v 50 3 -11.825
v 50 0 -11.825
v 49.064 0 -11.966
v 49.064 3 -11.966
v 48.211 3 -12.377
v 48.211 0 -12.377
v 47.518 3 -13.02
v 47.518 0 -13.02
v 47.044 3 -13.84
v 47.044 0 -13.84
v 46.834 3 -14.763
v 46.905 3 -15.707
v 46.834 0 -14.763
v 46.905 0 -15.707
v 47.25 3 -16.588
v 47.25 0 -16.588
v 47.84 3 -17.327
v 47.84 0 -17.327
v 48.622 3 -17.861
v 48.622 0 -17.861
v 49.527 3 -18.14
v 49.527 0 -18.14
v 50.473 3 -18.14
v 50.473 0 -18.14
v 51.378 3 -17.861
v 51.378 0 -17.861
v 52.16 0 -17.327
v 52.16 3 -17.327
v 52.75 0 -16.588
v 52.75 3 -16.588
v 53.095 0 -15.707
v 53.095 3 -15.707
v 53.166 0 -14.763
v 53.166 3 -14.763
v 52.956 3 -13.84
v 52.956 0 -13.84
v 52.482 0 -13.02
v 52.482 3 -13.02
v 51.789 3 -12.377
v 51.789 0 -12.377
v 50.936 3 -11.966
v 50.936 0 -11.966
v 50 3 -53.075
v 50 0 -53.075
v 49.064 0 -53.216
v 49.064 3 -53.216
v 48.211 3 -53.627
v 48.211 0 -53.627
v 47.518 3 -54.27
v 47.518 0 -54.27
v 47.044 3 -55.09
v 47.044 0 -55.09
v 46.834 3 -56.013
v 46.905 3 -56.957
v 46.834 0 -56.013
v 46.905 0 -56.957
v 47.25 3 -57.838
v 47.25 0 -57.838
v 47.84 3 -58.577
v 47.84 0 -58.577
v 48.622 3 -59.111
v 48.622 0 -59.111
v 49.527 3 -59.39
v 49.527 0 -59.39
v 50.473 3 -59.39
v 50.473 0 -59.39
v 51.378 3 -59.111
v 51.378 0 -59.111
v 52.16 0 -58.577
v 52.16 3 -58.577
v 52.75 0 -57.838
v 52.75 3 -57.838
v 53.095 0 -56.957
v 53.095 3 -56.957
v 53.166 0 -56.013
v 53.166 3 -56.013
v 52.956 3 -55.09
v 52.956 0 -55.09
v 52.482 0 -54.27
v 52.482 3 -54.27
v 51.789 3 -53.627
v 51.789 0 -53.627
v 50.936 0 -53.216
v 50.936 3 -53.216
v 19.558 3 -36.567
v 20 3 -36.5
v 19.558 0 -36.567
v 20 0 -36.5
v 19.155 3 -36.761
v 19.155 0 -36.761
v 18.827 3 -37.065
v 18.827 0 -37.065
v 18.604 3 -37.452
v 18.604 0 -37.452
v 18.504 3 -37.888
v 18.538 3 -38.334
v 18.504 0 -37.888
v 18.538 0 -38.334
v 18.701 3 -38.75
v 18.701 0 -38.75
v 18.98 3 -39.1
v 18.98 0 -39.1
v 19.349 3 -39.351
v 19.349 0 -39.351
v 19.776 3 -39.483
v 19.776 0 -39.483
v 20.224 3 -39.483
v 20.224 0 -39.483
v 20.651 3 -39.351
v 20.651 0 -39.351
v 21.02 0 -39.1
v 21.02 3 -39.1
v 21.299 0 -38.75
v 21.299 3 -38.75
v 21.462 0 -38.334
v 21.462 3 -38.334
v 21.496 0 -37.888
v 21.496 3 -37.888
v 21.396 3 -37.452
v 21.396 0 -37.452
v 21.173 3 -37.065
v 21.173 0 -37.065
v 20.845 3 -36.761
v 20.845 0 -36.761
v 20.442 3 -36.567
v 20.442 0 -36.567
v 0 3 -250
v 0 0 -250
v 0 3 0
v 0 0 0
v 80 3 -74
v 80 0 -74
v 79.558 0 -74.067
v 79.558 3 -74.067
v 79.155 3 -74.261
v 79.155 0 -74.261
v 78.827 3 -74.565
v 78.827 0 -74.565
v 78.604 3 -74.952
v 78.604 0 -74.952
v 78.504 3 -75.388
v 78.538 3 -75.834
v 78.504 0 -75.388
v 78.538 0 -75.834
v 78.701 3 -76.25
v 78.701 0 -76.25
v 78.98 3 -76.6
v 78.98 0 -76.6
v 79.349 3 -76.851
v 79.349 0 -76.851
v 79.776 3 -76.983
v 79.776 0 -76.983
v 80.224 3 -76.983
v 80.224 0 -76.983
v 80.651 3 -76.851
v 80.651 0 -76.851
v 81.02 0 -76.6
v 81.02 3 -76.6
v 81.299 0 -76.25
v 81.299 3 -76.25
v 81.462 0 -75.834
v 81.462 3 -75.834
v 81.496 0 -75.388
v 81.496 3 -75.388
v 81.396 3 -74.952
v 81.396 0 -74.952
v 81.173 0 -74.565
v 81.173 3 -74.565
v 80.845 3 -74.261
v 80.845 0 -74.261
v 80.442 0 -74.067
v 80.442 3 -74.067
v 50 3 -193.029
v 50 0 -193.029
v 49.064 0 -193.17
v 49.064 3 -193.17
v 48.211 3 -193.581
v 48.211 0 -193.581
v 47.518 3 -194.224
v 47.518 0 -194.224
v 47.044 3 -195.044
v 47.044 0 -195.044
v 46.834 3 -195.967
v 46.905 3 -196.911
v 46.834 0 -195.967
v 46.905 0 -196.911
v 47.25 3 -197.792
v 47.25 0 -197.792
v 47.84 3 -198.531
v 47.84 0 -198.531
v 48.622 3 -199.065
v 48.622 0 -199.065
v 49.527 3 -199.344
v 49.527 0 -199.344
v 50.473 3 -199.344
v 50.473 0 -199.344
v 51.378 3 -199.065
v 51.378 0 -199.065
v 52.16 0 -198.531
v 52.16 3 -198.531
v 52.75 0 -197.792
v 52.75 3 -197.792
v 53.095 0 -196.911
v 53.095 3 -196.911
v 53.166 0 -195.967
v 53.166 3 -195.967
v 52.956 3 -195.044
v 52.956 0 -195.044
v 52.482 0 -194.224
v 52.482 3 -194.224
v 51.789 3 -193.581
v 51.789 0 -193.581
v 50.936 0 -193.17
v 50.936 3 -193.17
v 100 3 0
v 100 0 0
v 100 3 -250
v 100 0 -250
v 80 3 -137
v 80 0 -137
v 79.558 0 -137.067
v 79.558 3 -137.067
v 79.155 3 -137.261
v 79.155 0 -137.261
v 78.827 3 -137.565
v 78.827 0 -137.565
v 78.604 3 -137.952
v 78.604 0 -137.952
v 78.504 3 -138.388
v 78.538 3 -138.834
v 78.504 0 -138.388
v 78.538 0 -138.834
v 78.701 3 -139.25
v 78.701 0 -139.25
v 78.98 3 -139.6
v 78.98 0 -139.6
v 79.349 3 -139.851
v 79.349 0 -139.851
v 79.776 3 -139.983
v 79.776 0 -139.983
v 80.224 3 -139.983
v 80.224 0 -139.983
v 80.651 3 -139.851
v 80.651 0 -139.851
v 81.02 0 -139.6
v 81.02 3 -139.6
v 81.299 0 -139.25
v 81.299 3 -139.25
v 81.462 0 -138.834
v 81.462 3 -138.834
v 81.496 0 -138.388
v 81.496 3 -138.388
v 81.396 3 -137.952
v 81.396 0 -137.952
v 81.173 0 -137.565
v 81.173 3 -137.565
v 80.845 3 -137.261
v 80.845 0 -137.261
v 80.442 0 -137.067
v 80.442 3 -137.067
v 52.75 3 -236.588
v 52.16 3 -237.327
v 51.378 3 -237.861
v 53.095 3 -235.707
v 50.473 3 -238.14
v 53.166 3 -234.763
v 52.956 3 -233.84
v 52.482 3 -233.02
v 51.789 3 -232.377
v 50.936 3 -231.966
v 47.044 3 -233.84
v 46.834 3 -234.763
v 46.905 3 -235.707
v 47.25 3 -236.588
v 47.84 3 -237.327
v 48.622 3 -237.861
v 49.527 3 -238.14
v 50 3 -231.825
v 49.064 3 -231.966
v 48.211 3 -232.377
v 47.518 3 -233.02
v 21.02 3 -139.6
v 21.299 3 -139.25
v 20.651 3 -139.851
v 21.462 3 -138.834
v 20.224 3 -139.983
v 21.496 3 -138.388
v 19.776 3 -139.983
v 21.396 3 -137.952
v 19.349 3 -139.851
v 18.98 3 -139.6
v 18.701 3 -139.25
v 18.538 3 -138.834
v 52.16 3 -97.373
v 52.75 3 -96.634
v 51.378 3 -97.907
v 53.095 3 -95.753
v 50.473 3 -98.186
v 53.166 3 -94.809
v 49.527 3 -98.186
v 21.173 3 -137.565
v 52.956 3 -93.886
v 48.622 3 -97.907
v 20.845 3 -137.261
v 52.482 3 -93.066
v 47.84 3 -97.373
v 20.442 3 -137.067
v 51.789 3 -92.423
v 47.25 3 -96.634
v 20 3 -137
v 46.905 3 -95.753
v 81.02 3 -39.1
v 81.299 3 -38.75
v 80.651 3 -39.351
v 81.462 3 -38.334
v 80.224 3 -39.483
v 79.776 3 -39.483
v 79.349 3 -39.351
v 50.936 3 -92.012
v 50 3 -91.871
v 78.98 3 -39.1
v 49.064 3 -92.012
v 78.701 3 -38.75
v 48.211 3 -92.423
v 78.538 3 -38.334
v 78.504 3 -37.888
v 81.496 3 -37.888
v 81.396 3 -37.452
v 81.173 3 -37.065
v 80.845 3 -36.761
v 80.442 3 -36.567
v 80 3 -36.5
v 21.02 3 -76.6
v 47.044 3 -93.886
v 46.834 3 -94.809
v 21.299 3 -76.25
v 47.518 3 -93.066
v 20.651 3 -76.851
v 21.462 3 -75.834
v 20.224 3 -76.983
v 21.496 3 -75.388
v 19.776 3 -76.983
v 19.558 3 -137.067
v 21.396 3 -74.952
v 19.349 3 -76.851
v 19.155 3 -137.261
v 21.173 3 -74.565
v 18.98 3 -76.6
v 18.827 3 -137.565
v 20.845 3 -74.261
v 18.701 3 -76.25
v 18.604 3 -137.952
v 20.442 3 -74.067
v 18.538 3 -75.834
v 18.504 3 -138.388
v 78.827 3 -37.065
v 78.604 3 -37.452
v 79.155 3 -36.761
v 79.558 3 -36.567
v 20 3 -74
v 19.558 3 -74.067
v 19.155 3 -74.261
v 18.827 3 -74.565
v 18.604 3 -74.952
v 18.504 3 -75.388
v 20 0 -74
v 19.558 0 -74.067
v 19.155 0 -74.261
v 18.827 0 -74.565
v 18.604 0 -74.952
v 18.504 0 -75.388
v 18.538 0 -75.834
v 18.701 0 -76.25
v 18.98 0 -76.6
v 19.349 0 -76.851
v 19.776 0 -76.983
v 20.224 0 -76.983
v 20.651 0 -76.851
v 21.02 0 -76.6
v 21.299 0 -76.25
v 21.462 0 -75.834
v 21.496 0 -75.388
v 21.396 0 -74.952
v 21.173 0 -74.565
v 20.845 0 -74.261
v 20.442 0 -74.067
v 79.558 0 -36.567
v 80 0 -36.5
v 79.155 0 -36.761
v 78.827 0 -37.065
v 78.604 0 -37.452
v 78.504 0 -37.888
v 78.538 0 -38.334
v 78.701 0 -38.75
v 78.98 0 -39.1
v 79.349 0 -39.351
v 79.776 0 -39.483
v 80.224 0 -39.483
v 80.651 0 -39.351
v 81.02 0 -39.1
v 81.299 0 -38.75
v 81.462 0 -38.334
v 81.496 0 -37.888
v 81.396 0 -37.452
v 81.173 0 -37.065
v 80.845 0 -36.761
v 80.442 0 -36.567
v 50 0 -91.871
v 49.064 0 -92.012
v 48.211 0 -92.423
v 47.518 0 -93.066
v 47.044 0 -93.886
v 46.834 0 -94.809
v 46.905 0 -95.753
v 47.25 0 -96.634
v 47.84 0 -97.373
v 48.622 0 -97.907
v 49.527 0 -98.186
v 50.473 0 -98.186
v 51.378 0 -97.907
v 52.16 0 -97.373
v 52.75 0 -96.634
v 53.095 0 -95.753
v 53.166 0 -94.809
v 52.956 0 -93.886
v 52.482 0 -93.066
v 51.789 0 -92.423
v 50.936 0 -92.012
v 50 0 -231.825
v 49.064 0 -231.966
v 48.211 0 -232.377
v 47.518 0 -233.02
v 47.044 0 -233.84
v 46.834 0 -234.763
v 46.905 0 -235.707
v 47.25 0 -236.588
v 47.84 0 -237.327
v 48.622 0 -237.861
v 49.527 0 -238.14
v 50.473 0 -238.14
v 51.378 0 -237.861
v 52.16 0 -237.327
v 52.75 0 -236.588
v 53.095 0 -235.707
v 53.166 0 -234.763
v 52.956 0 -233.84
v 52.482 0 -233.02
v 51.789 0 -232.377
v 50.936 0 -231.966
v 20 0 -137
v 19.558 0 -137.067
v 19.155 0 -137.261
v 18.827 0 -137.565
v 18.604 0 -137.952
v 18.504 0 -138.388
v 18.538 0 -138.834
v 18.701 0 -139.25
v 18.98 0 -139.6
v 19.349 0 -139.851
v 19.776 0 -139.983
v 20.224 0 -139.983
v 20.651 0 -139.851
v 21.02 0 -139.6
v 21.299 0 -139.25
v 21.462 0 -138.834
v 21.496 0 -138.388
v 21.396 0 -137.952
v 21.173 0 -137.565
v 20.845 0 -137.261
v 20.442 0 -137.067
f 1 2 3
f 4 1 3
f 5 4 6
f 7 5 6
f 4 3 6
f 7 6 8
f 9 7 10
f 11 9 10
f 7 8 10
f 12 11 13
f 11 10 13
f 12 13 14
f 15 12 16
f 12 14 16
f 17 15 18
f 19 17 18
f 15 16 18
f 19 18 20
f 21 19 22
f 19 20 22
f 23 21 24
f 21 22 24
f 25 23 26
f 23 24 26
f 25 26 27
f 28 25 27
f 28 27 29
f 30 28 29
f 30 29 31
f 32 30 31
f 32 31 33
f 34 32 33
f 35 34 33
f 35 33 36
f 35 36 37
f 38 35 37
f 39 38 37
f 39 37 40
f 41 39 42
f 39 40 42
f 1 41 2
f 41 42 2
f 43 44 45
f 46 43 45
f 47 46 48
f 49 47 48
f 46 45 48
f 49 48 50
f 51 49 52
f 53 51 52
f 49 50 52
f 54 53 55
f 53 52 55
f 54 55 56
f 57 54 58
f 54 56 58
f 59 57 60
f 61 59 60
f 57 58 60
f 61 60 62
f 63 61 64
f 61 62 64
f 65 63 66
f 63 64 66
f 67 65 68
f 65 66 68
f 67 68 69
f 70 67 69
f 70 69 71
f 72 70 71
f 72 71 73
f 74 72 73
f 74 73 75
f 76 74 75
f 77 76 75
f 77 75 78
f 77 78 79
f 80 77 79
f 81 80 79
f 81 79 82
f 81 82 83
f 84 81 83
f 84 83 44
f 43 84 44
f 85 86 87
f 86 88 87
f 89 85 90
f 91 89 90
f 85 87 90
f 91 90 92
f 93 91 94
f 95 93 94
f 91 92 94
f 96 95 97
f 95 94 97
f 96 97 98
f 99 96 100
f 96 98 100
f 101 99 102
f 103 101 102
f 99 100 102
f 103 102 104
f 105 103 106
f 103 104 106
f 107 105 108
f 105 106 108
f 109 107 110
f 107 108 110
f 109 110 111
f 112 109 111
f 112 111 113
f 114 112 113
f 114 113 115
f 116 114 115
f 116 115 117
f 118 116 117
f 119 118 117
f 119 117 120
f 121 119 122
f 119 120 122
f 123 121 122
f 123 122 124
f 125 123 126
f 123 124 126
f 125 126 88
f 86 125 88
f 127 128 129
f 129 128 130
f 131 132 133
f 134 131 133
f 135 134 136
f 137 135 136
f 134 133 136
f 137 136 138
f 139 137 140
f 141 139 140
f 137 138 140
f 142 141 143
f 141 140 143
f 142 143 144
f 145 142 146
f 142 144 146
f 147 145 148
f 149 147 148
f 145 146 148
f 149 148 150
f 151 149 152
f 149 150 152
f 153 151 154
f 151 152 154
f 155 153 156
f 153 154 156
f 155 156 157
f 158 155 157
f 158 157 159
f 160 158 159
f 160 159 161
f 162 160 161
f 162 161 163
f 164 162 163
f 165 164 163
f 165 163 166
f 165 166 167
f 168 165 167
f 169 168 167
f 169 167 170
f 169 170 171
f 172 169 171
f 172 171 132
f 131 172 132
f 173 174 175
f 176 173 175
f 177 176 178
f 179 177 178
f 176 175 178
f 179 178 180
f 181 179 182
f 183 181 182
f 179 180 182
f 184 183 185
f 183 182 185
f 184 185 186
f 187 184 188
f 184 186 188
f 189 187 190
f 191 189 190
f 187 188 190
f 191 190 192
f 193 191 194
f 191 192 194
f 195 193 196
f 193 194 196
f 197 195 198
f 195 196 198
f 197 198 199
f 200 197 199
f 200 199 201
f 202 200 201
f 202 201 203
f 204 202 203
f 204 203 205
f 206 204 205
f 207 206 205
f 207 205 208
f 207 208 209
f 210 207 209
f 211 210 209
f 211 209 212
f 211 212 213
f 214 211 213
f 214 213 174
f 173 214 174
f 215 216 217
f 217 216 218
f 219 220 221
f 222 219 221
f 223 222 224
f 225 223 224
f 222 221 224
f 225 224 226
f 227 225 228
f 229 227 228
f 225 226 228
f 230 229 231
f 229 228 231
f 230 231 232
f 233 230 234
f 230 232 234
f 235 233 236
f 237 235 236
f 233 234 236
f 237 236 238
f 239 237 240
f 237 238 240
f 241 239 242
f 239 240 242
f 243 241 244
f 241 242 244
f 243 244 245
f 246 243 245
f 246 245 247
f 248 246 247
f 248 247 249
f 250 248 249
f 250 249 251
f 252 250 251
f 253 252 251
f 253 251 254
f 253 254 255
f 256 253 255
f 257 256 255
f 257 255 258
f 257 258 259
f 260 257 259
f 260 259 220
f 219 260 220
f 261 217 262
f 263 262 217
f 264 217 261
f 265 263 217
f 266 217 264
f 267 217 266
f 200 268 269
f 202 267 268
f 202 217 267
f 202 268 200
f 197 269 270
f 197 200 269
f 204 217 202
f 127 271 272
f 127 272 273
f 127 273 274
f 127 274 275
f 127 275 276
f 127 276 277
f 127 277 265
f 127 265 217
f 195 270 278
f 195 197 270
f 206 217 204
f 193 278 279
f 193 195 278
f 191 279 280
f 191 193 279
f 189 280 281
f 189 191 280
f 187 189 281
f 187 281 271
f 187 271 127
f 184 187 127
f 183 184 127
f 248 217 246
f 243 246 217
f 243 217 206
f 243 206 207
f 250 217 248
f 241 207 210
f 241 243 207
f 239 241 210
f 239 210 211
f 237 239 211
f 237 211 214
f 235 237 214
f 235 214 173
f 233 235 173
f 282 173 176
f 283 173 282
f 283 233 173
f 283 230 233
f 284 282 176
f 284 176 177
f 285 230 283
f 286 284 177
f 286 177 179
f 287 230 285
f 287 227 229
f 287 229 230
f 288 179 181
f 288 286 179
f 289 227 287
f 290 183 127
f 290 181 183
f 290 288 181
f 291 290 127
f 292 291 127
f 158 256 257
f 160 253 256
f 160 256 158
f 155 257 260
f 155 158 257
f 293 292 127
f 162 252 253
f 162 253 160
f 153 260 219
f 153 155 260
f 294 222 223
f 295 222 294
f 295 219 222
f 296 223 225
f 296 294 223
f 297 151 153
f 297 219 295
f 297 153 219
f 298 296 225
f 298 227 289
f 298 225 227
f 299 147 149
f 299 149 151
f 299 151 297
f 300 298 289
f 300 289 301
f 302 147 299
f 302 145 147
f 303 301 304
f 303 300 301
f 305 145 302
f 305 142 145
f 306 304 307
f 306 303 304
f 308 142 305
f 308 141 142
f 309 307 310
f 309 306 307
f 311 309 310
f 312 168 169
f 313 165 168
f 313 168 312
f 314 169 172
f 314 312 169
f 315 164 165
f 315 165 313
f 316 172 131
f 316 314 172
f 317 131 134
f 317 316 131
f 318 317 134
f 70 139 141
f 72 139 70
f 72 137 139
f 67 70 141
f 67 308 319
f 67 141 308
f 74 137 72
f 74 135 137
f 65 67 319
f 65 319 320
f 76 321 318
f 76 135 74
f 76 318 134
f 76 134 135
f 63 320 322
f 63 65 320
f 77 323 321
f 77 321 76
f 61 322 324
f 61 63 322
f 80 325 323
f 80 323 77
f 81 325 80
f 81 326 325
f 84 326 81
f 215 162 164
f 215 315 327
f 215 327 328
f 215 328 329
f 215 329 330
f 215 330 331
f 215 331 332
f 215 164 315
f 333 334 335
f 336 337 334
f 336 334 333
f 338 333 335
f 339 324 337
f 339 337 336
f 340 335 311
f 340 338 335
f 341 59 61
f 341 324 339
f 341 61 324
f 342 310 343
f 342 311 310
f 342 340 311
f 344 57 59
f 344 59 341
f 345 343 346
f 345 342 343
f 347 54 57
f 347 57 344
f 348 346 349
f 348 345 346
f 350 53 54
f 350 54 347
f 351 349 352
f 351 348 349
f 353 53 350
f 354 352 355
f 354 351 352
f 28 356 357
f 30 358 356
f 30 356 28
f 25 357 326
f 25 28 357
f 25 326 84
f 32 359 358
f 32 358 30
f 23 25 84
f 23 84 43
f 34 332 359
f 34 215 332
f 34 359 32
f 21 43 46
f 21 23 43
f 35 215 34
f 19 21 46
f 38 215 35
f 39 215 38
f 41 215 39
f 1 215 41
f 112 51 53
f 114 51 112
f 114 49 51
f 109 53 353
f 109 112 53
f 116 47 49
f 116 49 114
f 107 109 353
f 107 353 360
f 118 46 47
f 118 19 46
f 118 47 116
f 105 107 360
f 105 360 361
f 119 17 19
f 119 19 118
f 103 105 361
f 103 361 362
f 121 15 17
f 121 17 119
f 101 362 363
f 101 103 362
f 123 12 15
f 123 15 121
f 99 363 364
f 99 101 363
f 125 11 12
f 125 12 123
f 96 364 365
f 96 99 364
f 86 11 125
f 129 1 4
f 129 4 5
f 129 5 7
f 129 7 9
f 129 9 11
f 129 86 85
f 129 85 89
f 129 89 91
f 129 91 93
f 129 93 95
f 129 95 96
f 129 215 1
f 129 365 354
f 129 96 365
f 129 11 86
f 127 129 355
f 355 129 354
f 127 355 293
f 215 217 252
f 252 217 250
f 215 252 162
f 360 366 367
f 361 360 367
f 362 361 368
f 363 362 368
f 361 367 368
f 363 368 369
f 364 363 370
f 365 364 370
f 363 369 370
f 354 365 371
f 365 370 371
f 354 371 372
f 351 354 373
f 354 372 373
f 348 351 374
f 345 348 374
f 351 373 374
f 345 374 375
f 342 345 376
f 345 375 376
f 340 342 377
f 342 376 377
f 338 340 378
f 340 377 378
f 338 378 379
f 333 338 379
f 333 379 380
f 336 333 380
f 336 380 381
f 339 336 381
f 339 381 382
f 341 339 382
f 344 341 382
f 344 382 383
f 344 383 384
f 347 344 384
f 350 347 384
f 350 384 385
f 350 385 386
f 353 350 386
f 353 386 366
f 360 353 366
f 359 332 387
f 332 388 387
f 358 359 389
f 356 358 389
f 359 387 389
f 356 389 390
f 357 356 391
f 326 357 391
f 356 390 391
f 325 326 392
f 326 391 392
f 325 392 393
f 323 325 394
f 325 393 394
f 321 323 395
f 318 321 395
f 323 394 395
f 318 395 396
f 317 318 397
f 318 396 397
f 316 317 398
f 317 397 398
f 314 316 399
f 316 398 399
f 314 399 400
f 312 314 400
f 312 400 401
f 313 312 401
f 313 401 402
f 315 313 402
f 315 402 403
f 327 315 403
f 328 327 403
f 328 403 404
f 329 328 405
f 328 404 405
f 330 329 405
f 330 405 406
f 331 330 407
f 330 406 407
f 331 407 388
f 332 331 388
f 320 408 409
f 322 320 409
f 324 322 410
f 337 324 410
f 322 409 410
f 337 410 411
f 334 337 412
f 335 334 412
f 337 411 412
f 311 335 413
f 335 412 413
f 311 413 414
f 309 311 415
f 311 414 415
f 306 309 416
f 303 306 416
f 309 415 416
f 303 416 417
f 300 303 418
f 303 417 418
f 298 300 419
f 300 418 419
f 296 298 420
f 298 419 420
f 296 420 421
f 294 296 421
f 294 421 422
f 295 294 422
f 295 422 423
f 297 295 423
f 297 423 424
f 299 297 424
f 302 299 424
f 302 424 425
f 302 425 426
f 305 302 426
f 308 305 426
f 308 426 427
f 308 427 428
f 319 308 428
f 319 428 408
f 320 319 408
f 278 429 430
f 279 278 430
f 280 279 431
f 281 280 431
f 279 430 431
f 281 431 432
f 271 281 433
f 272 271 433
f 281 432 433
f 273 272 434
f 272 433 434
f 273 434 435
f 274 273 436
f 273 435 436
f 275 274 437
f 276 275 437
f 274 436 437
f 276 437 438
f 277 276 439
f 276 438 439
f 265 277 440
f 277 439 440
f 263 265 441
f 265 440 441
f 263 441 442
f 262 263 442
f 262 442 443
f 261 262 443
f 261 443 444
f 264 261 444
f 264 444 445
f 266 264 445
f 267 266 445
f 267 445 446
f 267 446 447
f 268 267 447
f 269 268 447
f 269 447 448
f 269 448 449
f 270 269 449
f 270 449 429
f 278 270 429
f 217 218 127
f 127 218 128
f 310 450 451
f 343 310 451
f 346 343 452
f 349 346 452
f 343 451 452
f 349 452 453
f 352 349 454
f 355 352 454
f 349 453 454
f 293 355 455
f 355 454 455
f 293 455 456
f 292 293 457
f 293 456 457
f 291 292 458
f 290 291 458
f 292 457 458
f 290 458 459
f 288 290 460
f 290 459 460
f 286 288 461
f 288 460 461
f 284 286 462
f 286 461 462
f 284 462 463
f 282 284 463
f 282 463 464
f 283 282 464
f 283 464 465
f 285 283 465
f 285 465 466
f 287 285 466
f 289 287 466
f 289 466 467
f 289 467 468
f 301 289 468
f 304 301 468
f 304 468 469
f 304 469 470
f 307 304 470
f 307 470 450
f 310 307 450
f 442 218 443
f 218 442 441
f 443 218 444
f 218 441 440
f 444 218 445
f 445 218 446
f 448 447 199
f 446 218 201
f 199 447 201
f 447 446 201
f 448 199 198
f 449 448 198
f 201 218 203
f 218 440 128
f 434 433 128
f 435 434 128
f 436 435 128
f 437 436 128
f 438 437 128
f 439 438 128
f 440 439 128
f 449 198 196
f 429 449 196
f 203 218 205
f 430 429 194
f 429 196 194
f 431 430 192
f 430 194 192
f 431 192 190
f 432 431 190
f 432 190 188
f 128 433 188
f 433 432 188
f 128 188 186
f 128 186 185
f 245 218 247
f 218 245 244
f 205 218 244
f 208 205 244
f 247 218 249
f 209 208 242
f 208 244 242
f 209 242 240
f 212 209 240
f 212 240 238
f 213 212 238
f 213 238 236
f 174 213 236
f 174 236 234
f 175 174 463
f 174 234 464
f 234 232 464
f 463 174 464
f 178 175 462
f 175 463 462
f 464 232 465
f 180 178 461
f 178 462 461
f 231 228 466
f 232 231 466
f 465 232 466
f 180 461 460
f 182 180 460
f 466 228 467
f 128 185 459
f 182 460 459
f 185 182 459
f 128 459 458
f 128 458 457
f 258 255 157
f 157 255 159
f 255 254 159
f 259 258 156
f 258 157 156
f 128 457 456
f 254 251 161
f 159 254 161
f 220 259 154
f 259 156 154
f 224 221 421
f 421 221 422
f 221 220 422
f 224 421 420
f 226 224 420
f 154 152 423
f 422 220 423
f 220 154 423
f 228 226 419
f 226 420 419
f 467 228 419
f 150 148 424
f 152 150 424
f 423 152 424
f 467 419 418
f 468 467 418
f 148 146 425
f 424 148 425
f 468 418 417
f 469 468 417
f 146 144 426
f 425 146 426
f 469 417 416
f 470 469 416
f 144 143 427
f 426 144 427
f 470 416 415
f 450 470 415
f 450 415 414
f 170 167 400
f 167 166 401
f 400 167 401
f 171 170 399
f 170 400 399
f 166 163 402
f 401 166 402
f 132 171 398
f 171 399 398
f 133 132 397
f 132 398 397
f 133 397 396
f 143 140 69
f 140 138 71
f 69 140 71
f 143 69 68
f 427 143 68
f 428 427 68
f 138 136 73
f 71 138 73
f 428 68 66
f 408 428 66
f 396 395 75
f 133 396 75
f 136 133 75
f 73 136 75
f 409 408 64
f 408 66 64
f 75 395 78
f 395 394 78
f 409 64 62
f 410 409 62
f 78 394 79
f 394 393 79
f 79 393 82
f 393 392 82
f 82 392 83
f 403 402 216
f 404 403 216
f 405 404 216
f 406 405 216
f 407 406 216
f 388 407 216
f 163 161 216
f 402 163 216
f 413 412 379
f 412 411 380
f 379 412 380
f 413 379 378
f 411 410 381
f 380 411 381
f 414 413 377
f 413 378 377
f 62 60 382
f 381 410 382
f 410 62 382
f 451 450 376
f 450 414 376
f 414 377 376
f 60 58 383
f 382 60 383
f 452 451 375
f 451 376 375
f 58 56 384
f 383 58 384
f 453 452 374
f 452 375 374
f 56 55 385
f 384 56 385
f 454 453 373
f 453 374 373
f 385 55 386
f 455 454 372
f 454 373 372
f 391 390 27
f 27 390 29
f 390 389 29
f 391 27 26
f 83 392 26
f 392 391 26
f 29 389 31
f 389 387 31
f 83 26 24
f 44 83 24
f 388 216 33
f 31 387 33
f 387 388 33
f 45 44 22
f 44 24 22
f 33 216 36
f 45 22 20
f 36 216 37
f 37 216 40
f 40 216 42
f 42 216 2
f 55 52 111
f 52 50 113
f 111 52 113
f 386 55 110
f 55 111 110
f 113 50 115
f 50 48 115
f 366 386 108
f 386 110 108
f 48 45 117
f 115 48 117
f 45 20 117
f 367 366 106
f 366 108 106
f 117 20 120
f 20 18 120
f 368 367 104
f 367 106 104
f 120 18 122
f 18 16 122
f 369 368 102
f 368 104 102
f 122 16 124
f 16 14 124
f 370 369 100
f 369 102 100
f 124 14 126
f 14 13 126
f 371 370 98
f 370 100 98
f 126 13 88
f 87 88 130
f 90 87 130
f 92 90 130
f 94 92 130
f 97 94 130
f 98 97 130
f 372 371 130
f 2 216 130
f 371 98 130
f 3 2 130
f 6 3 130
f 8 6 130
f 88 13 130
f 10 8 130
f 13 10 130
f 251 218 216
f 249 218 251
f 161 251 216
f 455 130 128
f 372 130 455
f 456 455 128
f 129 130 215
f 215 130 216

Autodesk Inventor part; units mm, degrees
ref_plane "YZ Plane" through (0, 0, 0) normal (1, 0, 0) x (0, 1, 0)
ref_plane "XZ Plane" through (0, 0, 0) normal (0, 1, 0) x (-1, 0, 0)
ref_plane "XY Plane" through (0, 0, 0) normal (0, 0, 1) x (1, 0, 0)
sketch "Sketch1" plane through (0, 0, 0) normal (0, 1, 0) x (-1, 0, 0)
  line L0 (0, 0) -> (-100, 0)
  line L1 (-100, 0) -> (-100, -250)
  line L2 (-100, -250) -> (0, -250)
  line L3 (0, -250) -> (0, 0)
  dimension "d0" = 100
  dimension "d1" = 250
extrude "Extrusion1" add sketch "Sketch1" along normal blind 3
sketch "Sketch2" plane through (0, 3, 0) normal (0, 1, 0) x (1, 0, 0)
  line L0 (0, 0) -> (100, 0) projected
  line L1 (0, 0) -> (20, 38) construction
  line L2 (80, 38) -> (100, 0) construction
  point P0 (20, 75.5)
  point P1 (80, 75.5)
  point P2 (20, 138.5)
  point P3 (80, 138.5)
  dimension "d4" = 60
  dimension "d5" = 37.5
  dimension "d6" = 63
  dimension "d7" = 38
hole "Hole1" at (20, 3, -38) at (80, 3, -38) at (20, 3, -75.5) at (80, 3, -75.5) at (20, 3, -138.5) at (80, 3, -138.5) direction (0, -1, 0) diameter 3 end through all
sketch "Sketch3" plane through (0, 3, 0) normal (0, 1, 0) x (1, 0, 0)
  line L0 (0, 0) -> (100, 0) construction
  line L1 (0, 0) -> (50, 15) construction
  line L2 (100, 0) -> (100, 250) construction
  line L3 (50, 15) -> (100, 0) construction
  line L4 (100, 250) -> (0, 250) projected
  point P0 (50, 56.25)
  point P1 (50, 196.204)
  point P2 (50, 95.046)
  point P3 (50, 235)
  dimension "d15" = 15
  dimension "d16" = 41.25
  dimension "d17" = 139.954
  dimension "d25" = 139.954
  dimension "d26" = 15
hole "Hole2" at (50, 3, -15) at (50, 3, -56.25) at (50, 3, -196.204) at (50, 3, -95.046) at (50, 3, -235) direction (0, -1, 0) diameter 6.35 end through all
equation "\"d25\" = d17"
properties part number "Aluminum Plate" material "Aluminum 6061"
